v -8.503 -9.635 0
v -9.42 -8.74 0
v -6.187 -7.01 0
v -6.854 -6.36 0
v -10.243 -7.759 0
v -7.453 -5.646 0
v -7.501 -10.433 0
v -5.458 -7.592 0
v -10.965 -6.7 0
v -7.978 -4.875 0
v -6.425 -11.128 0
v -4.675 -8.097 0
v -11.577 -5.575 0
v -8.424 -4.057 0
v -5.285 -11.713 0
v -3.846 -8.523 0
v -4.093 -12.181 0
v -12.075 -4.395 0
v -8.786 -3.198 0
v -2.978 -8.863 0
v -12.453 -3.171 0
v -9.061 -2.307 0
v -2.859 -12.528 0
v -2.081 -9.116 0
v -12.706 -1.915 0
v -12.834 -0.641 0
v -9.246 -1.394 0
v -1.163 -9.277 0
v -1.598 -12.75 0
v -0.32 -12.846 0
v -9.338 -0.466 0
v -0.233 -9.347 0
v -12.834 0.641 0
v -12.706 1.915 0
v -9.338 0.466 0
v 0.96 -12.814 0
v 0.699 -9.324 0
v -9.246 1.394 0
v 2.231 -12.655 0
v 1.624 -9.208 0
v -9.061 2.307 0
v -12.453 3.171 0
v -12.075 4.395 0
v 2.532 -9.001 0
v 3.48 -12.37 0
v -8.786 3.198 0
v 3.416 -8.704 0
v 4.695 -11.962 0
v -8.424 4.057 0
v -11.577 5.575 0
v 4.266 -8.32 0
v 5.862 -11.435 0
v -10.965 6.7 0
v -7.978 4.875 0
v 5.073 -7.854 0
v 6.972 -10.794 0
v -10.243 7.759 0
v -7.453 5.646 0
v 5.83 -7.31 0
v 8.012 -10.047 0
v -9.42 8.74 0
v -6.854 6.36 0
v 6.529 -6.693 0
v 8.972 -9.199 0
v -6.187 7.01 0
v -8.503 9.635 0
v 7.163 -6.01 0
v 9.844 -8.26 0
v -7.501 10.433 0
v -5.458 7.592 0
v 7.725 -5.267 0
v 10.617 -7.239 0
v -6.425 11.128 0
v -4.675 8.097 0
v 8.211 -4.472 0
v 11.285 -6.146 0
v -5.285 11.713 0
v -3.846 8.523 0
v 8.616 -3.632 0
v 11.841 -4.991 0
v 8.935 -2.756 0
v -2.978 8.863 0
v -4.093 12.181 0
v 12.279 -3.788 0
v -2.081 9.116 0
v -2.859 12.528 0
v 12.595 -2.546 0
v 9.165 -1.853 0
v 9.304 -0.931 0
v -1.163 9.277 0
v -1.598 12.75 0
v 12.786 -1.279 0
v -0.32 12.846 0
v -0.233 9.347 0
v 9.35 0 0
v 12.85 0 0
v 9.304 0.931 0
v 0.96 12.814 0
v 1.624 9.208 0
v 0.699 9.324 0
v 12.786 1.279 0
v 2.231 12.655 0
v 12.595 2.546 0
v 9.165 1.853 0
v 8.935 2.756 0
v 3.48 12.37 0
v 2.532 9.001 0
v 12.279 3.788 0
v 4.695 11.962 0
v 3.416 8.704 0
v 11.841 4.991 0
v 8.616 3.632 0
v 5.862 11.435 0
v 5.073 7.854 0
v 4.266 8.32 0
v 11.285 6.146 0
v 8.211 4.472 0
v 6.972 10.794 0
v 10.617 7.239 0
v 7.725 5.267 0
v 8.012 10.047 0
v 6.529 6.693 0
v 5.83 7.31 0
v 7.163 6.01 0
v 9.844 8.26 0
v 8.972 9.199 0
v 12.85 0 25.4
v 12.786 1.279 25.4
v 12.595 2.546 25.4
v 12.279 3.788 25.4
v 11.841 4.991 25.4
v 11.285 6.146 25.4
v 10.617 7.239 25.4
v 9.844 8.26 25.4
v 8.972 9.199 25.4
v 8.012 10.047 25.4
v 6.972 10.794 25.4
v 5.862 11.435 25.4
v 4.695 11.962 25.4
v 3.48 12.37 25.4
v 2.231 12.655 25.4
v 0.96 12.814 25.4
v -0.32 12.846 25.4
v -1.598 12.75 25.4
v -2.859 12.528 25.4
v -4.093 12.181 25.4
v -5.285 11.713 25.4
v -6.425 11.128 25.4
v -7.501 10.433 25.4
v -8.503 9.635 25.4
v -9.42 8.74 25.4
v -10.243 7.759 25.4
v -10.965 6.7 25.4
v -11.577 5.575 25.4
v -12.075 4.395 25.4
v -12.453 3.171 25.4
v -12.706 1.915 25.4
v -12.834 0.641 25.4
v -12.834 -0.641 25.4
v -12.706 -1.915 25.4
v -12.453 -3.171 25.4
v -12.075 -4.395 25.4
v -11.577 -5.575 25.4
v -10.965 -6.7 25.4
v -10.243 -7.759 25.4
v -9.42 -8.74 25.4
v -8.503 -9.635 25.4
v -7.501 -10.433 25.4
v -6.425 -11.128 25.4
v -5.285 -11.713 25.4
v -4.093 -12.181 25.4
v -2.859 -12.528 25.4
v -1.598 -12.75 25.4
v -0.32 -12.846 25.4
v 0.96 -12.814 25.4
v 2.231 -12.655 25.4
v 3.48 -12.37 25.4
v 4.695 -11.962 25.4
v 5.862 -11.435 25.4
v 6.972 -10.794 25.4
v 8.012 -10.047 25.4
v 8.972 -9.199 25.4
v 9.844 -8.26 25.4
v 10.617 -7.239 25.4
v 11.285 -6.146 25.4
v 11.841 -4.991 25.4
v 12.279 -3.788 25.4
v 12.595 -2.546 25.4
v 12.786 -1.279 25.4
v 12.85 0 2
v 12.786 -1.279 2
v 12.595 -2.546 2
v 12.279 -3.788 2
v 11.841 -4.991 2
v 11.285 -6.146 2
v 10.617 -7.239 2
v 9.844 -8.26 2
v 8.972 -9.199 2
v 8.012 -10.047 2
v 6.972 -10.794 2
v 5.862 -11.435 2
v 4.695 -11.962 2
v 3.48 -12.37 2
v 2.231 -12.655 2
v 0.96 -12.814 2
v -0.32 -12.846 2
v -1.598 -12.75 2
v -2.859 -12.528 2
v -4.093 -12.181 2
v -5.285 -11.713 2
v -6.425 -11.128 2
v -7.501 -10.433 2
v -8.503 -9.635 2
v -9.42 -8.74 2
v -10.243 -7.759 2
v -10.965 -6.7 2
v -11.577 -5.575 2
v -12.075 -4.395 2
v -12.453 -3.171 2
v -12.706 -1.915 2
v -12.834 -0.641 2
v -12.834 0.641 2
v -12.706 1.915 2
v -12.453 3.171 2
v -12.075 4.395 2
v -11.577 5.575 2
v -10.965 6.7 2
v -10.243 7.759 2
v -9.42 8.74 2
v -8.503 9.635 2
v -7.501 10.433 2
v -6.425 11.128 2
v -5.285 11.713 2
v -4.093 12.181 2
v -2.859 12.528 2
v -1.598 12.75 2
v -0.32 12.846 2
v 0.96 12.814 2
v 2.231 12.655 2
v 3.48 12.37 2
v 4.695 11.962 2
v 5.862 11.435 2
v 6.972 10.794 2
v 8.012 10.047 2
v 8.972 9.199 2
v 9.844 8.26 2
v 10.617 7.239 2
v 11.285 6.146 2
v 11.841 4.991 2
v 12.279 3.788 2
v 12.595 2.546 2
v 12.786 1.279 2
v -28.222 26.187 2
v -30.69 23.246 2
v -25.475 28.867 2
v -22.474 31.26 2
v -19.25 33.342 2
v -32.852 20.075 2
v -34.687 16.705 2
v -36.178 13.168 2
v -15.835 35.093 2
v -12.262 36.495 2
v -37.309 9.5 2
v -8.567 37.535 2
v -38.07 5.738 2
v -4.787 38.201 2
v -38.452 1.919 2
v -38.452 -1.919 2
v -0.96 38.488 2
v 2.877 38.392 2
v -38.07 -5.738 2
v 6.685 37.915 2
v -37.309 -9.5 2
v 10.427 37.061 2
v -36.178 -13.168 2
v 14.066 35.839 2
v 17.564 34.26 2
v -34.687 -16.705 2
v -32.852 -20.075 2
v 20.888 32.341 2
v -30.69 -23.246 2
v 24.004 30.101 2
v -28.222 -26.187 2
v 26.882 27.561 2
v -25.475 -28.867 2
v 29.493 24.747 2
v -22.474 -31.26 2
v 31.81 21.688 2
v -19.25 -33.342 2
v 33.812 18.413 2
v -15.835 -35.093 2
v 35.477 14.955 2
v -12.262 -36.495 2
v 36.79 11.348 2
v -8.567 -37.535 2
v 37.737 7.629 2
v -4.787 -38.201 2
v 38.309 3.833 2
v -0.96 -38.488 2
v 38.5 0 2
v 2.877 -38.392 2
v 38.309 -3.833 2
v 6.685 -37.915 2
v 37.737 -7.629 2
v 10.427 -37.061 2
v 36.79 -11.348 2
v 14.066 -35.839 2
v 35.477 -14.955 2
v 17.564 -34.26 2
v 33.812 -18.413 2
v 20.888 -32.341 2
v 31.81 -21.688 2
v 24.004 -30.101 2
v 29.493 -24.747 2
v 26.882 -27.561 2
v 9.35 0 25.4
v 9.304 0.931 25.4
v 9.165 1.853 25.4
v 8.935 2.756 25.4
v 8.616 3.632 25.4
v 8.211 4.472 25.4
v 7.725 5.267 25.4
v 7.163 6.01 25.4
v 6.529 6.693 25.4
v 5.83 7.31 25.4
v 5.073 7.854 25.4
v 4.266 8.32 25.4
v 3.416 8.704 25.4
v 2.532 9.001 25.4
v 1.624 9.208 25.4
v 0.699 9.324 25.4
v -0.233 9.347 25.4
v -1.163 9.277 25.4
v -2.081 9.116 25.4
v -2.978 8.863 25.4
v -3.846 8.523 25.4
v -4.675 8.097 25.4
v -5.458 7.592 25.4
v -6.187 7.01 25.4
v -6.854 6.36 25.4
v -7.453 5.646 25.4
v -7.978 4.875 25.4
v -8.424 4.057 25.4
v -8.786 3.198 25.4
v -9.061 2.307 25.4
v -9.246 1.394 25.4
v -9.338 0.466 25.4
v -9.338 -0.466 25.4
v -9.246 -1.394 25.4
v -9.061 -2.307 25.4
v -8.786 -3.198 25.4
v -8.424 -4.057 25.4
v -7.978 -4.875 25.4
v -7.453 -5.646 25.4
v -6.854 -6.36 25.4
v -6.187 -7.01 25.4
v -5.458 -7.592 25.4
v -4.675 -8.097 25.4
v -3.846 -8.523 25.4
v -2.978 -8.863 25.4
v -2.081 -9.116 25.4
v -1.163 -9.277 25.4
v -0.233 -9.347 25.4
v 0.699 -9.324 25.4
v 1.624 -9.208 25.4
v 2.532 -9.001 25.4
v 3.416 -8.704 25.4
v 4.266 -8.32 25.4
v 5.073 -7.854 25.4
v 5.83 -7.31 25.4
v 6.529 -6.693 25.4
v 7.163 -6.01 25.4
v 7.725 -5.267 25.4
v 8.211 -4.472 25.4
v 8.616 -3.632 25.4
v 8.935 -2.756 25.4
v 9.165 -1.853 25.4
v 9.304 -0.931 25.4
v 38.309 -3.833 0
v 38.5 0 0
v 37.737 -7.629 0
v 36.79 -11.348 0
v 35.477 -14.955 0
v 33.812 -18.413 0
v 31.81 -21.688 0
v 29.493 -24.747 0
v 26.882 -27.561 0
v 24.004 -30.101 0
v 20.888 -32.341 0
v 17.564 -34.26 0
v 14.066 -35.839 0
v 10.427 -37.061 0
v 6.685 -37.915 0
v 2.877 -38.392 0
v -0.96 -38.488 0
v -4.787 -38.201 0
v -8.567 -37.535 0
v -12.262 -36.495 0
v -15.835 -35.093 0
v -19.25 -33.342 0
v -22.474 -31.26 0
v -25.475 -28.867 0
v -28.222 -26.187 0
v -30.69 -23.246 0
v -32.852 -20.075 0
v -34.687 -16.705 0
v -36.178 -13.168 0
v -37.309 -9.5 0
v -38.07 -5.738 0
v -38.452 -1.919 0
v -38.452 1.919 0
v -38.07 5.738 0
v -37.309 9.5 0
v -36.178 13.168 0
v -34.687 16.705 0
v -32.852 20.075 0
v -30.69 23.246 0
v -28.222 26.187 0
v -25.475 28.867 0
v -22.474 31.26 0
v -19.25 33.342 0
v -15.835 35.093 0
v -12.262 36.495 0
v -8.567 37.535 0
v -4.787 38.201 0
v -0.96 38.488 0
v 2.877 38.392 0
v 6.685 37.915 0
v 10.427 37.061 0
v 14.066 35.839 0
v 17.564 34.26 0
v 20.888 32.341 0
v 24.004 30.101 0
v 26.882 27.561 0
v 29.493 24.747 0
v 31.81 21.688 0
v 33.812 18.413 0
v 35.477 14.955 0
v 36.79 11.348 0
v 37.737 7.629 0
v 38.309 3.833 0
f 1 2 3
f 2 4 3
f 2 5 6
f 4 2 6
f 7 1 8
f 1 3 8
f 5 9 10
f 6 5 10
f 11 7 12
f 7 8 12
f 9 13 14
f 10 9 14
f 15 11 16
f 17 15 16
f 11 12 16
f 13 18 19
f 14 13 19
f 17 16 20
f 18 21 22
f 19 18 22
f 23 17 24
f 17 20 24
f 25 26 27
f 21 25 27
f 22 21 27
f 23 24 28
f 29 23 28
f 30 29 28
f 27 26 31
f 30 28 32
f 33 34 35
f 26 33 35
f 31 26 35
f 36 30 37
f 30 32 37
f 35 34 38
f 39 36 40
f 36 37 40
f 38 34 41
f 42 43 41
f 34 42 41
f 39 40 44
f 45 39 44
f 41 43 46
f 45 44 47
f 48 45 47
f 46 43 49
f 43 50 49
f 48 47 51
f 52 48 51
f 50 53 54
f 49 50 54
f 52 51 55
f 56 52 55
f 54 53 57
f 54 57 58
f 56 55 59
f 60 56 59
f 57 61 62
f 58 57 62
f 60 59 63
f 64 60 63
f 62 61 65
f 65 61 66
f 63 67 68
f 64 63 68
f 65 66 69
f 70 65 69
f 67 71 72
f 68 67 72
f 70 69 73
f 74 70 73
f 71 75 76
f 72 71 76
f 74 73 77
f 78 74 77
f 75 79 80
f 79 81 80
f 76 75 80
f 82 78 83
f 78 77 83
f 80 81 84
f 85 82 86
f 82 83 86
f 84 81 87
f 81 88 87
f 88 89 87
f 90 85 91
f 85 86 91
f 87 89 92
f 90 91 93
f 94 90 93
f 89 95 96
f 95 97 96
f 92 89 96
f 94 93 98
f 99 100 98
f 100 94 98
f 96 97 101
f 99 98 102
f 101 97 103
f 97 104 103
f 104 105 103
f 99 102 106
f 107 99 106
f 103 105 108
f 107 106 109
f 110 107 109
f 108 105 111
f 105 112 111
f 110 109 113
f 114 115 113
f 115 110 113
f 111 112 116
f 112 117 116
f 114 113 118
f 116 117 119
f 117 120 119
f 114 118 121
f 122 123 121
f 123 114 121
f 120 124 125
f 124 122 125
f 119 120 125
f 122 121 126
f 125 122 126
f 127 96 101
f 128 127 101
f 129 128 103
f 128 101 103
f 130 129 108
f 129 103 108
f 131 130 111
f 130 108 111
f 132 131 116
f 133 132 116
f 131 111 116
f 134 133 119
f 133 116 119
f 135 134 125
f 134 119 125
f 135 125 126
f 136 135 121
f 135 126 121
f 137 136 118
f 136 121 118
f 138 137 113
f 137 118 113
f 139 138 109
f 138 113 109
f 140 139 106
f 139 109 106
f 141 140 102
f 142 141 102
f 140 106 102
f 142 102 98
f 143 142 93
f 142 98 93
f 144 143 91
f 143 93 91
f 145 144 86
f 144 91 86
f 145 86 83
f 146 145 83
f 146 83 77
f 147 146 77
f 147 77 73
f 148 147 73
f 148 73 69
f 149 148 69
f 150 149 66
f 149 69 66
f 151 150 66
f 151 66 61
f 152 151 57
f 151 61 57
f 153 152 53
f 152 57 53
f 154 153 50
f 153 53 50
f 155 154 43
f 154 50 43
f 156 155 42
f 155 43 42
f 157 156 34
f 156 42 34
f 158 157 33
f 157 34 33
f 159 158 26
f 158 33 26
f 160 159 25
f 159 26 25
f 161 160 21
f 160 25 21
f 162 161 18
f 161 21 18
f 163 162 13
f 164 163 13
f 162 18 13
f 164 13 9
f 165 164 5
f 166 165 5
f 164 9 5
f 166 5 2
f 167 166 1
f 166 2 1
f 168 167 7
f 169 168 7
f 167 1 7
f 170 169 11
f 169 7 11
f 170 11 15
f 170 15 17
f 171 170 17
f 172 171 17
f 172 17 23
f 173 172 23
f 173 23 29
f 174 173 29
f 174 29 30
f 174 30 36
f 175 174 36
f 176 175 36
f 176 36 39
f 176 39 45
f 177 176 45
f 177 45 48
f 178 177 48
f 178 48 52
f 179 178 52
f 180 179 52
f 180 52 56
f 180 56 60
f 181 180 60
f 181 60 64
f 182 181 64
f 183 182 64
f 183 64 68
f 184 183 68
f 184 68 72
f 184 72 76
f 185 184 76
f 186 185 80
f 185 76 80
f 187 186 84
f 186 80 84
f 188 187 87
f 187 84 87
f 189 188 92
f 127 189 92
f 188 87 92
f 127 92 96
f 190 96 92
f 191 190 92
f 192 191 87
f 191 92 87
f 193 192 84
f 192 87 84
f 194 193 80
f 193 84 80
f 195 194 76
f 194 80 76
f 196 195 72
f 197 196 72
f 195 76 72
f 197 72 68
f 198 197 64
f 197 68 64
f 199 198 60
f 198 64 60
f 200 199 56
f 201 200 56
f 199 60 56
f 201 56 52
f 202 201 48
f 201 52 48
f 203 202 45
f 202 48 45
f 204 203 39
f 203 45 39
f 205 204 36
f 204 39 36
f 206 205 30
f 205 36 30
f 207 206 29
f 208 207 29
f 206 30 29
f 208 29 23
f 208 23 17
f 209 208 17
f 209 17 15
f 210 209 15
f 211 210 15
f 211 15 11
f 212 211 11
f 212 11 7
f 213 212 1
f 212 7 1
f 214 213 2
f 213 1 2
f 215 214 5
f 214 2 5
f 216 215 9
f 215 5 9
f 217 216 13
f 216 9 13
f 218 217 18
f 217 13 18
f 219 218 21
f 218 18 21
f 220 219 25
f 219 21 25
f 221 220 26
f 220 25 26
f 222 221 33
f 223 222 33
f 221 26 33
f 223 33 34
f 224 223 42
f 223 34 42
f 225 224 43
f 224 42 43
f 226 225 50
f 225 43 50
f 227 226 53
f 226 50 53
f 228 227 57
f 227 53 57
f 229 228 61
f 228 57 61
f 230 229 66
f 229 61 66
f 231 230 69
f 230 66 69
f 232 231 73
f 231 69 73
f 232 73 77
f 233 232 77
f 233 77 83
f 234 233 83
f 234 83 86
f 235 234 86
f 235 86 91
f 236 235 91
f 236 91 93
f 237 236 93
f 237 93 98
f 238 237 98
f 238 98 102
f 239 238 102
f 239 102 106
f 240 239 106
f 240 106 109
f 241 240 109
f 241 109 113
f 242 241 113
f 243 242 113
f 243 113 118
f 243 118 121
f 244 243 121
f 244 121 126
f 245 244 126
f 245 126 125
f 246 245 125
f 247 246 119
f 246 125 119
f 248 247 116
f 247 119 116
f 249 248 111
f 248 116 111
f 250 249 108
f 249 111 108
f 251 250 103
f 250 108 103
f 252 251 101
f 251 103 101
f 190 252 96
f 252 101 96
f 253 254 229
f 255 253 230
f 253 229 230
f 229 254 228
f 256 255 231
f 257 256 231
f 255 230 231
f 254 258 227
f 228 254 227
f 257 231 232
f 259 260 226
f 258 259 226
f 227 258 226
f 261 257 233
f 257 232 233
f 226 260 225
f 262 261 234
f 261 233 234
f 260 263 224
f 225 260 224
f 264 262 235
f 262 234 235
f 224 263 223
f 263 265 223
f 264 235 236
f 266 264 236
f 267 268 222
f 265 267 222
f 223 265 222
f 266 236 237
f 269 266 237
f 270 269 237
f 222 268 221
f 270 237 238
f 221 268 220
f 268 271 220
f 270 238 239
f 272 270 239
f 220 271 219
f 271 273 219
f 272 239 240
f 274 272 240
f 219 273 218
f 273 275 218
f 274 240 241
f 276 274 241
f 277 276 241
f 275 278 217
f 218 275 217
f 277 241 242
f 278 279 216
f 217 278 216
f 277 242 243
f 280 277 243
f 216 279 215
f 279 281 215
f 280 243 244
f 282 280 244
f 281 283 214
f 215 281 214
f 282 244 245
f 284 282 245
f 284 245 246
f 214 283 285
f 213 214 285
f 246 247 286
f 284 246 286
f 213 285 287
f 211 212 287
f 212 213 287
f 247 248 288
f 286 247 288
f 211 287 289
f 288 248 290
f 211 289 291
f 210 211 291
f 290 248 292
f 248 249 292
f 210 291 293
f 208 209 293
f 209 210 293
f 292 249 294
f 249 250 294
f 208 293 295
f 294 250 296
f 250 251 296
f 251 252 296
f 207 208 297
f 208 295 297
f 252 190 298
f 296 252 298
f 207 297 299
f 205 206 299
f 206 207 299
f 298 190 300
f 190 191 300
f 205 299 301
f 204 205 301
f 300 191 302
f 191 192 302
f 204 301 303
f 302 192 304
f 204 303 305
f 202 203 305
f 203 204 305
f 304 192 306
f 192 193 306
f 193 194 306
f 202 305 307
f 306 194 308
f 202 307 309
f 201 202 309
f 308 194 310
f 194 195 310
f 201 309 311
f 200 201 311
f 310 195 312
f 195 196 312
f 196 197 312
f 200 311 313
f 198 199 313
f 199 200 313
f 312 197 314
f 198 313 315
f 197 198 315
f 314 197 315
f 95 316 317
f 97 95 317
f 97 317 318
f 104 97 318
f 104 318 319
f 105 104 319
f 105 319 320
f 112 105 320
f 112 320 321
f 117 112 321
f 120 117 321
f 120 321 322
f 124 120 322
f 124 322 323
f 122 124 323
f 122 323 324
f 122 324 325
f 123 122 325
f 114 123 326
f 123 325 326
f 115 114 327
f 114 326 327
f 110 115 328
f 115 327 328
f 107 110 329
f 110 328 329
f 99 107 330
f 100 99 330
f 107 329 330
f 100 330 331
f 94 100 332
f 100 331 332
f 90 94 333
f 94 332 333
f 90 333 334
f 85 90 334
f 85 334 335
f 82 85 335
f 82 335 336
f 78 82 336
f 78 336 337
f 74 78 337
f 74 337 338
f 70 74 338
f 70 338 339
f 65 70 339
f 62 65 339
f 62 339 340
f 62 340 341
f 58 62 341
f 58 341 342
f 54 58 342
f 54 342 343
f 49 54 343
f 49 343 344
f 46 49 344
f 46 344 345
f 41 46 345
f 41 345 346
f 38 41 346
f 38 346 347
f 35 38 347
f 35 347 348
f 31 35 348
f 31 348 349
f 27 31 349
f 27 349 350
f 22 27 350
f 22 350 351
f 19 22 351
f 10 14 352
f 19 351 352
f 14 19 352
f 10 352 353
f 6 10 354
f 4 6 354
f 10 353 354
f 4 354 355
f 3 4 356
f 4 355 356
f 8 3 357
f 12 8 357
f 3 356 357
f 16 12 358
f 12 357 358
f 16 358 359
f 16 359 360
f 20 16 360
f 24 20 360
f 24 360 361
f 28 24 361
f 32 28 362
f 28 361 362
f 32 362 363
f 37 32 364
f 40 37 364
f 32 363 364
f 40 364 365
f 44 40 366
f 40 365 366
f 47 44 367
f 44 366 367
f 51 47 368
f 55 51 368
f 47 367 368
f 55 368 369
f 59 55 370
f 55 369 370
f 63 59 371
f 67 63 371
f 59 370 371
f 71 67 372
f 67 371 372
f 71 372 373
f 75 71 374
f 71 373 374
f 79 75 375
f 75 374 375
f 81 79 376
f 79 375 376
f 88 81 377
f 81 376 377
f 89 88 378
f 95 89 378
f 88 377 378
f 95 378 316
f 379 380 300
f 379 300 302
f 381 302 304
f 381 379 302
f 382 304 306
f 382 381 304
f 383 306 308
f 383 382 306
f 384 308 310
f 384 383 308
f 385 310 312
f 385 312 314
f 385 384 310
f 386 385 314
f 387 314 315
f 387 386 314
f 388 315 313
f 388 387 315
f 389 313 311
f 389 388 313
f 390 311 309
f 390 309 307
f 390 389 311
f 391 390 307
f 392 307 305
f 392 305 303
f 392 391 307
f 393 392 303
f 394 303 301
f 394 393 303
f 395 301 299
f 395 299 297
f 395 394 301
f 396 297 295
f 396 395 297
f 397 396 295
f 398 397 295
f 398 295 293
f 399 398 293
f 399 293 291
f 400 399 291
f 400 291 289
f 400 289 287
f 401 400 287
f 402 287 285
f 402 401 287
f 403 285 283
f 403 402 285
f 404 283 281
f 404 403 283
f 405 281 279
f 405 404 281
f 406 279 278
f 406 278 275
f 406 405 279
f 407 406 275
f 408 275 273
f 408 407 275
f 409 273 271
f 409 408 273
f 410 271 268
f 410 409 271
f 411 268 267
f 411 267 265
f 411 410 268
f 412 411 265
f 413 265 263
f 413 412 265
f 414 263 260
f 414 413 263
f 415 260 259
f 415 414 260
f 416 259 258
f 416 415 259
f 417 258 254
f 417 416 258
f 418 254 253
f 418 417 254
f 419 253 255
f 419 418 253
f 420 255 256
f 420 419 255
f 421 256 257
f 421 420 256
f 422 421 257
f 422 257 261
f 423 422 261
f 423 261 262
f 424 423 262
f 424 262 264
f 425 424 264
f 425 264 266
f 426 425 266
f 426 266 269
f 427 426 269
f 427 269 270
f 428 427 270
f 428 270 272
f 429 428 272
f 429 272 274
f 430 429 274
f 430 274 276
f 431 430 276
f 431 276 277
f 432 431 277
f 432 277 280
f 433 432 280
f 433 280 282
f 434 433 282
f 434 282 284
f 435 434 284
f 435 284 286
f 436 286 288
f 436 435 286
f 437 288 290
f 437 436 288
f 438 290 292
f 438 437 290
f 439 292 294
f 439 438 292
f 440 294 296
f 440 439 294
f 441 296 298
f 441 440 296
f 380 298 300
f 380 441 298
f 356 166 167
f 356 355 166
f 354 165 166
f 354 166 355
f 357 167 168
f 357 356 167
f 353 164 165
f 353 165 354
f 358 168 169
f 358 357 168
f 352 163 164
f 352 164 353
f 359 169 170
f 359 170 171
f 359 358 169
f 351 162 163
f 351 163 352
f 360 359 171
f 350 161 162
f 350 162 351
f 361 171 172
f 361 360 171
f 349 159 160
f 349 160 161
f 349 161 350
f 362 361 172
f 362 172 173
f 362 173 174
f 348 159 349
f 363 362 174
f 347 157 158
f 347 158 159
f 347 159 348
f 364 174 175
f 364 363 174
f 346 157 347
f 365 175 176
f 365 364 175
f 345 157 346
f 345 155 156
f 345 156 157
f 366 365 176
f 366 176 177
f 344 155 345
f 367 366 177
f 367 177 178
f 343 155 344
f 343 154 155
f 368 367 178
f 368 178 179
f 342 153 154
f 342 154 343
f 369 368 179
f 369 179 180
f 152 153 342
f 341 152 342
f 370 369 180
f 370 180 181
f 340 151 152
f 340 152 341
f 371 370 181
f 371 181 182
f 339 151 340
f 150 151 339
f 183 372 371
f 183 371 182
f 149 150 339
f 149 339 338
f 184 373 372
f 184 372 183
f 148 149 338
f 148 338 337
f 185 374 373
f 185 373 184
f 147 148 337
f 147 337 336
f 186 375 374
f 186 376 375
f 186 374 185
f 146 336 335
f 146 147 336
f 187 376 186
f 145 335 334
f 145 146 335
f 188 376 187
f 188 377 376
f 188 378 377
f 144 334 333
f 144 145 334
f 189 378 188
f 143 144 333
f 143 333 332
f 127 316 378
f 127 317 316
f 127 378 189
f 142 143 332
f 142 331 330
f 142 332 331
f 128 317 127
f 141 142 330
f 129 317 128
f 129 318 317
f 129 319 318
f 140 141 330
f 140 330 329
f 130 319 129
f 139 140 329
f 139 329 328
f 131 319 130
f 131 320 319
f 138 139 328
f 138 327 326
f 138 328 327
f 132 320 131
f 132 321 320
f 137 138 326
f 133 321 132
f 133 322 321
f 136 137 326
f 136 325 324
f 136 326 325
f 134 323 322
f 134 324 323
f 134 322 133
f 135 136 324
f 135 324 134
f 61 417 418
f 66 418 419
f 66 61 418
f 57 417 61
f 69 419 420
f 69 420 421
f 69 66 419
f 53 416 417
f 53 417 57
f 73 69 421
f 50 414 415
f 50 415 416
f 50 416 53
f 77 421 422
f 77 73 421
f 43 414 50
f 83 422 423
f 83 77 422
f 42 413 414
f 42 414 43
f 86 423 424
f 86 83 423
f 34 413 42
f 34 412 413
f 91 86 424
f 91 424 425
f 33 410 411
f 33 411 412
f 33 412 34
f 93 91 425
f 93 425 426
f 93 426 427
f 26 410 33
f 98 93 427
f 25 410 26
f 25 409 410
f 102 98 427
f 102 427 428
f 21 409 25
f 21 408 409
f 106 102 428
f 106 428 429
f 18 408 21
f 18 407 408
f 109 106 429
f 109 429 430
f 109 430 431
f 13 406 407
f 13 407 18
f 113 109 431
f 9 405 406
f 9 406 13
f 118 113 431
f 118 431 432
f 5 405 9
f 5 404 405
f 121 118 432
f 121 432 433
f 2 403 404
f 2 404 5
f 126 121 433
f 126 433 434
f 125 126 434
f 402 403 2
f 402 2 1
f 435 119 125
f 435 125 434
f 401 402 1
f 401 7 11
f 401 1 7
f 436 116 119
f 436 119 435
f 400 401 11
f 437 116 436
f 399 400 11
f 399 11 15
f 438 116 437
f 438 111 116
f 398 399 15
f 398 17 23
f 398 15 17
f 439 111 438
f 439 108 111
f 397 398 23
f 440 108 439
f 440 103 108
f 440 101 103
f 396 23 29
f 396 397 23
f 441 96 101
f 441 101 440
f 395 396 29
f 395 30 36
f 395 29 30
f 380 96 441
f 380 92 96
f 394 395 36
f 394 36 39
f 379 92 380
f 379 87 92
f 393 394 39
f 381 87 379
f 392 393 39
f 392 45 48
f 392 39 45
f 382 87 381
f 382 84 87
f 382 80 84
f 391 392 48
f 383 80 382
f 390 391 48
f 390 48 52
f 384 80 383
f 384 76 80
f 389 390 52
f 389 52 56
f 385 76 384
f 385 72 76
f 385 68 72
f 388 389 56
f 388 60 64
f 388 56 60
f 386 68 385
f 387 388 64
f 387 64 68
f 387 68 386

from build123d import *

# Parameters (mm, degrees)
F0_R     = 12.85
F1_DEPTH = 25.4
F2_R     = 38.5
F2_R_2   = 12.85
F3_DEPTH = 2
F4_R     = 9.35
F5_DEPTH = 60


with BuildPart() as f1:
    # F0 (on Top) → F1 (new body)
    with BuildSketch(Plane.XY):
        Circle(F0_R)
    extrude(amount=F1_DEPTH)

    # F4 (on face) → F5 (cut)
    with BuildSketch(Plane.XY.offset(25.4)):
        Circle(F4_R)
    extrude(amount=-F5_DEPTH, mode=Mode.SUBTRACT)


with BuildPart() as f3:
    # F2 (on face) → F3 (new body)
    with BuildSketch(Plane(origin=(0, 0, 0), x_dir=(1, 0, 0), z_dir=(0, 0, -1))):
        Circle(F2_R)
        Circle(F2_R_2, mode=Mode.SUBTRACT)
    extrude(amount=-F3_DEPTH)


solid = Compound([f1.part, f3.part])
